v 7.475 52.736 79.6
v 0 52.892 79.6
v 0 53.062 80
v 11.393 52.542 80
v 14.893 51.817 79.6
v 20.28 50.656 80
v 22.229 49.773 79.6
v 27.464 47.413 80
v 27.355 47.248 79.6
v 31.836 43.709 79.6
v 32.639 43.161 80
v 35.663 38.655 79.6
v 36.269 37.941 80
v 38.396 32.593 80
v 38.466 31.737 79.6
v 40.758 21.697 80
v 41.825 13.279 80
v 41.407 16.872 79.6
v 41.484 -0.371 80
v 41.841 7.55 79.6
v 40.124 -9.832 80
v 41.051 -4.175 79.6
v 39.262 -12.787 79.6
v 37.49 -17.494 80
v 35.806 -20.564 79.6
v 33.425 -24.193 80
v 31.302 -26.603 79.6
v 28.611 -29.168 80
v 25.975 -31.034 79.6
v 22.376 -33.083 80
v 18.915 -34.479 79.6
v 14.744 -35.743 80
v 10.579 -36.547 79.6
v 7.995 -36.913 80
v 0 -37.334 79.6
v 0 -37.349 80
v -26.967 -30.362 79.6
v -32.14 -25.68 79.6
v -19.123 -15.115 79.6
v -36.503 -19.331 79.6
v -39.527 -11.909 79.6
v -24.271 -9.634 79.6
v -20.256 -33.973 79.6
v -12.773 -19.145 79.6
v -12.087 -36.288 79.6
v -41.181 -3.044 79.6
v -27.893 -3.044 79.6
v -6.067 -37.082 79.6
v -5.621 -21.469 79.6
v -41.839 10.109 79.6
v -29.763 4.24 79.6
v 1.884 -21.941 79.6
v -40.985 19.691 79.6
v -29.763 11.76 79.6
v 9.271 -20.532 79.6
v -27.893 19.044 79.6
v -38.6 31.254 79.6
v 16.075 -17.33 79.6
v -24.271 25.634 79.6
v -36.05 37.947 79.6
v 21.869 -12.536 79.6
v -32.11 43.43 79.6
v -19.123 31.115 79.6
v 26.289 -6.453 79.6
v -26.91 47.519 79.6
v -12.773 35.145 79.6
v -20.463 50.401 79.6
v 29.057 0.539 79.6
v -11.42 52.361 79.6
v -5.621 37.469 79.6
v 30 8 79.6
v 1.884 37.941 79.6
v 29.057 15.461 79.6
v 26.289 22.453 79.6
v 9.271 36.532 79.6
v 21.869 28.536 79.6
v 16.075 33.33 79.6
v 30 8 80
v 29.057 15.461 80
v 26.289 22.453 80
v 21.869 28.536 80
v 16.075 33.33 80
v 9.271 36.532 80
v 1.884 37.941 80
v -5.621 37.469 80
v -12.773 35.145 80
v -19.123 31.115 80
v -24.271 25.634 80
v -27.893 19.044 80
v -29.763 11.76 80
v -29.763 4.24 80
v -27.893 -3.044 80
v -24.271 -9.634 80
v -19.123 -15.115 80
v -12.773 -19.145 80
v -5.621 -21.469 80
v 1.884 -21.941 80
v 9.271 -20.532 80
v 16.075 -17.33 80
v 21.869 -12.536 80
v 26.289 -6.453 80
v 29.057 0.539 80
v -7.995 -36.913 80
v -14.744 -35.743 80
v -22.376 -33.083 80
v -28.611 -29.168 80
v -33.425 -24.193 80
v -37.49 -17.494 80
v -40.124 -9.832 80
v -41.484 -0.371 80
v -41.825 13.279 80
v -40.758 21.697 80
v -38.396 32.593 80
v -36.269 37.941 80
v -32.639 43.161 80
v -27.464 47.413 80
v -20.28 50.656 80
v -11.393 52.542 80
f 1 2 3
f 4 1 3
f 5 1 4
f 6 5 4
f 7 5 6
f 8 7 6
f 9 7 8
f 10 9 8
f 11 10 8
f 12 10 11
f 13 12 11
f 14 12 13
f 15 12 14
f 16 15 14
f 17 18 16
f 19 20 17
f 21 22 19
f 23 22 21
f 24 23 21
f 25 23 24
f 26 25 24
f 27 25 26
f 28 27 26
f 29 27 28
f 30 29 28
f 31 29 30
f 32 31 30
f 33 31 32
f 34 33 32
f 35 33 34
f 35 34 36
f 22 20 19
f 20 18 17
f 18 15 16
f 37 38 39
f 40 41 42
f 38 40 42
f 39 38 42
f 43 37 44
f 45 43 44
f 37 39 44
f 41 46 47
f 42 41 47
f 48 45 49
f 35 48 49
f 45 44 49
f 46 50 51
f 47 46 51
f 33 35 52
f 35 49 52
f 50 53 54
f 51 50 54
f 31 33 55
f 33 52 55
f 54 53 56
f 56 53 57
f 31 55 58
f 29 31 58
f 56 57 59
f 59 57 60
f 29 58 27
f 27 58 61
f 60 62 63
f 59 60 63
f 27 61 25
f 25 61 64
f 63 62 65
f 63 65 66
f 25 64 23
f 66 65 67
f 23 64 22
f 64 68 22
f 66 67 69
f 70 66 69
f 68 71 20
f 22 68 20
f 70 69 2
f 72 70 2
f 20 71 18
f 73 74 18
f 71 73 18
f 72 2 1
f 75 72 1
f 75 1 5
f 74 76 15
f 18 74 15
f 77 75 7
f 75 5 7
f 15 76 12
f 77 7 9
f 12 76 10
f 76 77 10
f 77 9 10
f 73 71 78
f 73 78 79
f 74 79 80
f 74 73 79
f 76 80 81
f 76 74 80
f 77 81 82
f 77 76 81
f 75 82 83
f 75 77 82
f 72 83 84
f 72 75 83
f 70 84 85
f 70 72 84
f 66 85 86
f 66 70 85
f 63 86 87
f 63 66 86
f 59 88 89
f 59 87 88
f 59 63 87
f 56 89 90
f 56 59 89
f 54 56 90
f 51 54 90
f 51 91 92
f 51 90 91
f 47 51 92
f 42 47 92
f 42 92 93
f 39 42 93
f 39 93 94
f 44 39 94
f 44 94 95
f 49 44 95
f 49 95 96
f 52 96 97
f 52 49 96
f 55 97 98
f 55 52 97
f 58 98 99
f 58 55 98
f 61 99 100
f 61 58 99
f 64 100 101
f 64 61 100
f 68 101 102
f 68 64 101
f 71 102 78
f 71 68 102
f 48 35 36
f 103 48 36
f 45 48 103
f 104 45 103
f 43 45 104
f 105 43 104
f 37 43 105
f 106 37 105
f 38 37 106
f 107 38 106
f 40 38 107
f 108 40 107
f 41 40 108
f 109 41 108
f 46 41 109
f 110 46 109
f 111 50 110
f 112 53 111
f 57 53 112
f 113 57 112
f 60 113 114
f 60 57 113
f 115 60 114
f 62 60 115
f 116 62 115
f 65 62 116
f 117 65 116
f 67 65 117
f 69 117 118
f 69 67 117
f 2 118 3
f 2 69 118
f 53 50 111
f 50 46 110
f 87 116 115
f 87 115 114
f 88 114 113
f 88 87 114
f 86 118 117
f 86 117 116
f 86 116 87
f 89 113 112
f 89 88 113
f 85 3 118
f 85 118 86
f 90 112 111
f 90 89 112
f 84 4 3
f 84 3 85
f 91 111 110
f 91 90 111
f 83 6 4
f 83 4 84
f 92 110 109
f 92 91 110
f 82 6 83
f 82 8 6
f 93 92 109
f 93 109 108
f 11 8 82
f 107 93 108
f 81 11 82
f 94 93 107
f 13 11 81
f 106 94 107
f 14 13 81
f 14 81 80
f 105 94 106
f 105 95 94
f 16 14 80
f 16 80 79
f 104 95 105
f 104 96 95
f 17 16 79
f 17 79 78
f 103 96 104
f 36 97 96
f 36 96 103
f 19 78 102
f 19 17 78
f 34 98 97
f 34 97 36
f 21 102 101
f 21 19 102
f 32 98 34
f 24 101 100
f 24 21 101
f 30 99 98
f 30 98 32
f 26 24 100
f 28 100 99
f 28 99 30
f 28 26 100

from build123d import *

# Parameters (mm, degrees)
CYLINDER_R     = 30
CYLINDER_DEPTH = 10
BOX001_W       = 100
BOX001_H       = 100
BOX001_DEPTH   = 0.4


with BuildPart() as cylinder:
    # Cylinder → Cylinder (new body)
    with BuildSketch(Plane(origin=(0, 8, 78.2), x_dir=(1, 0, 0), z_dir=(0, 0, 1))):
        Circle(CYLINDER_R)
    extrude(amount=CYLINDER_DEPTH)


with BuildPart() as cube001:
    # Box001 → Box001 (new body)
    with BuildSketch(Plane(origin=(-53, -45.8, 79.6), x_dir=(1, 0, 0), z_dir=(0, 0, 1))):
        with Locations((50, 50)):
            Rectangle(BOX001_W, BOX001_H)
    extrude(amount=BOX001_DEPTH)


with BuildPart() as body005:
    # Sketch013 → AdditiveLoft005 section 0
    with BuildSketch(Plane.XY.offset(41)):
        with BuildLine():
            add(Edge.make_bspline(
                [(0, 36.497025), (26.576986, 35.262943), (47.796365, 0), (27.047079, -34.785005), (0, -35.8137)],
                knots=[0, 0, 0, 0, 0.5, 1, 1, 1, 1], degree=3))
            add(Edge.make_bspline(
                [(0, 36.497025), (-26.576986, 35.262943), (-47.796365, 0), (-27.047079, -34.785005), (0, -35.8137)],
                knots=[0, 0, 0, 0, 0.5, 1, 1, 1, 1], degree=3))
        make_face()
    # Sketch012 → AdditiveLoft005 section 1
    with BuildSketch(Plane.XY):
        with BuildLine():
            add(Edge.make_bspline(
                [(0, 32.9051), (28.479158, 34.285235), (40.246082, 0), (29.153858, -32.29409), (0, -31.3846)],
                knots=[0, 0, 0, 0, 0.5, 1, 1, 1, 1], degree=3))
            add(Edge.make_bspline(
                [(0, 32.9051), (-28.479158, 34.285235), (-40.246082, 0), (-29.153858, -32.29409), (0, -31.3846)],
                knots=[0, 0, 0, 0, 0.5, 1, 1, 1, 1], degree=3))
        make_face()
    loft(ruled=True)


with BuildPart() as cut:
    # Sketch011 → AdditiveLoft004 section 0
    with BuildSketch(Plane.XY.offset(80)):
        with BuildLine():
            add(Edge.make_bspline(
                [(0, 53.061848), (33.768852, 53.748959), (41.60467, 20.311575), (41.974278, 11.194203), (41.83811, 0), (38.792742, -22.041952), (21.032879, -37.277655), (0, -37.349277)],
                knots=[0, 0, 0, 0, 0.2, 0.4, 0.6, 0.8, 1, 1, 1, 1], degree=3))
            add(Edge.make_bspline(
                [(0, 53.061848), (-33.768852, 53.748959), (-41.60467, 20.311575), (-41.974278, 11.194203), (-41.83811, 0), (-38.792742, -22.041952), (-21.032879, -37.277655), (0, -37.349277)],
                knots=[0, 0, 0, 0, 0.2, 0.4, 0.6, 0.8, 1, 1, 1, 1], degree=3))
        make_face()
    # Sketch010 → AdditiveLoft004 section 1
    with BuildSketch(Plane.XY.offset(41)):
        with BuildLine():
            add(Edge.make_bspline(
                [(0, 36.497025), (26.576986, 35.262943), (47.796365, 0), (27.047079, -34.785005), (0, -35.8137)],
                knots=[0, 0, 0, 0, 0.5, 1, 1, 1, 1], degree=3))
            add(Edge.make_bspline(
                [(0, 36.497025), (-26.576986, 35.262943), (-47.796365, 0), (-27.047079, -34.785005), (0, -35.8137)],
                knots=[0, 0, 0, 0, 0.5, 1, 1, 1, 1], degree=3))
        make_face()
    loft(ruled=True)

    # Fusion003: union Body005
    add(body005.part)

    # Common001: intersect Cube001
    add(cube001.part, mode=Mode.INTERSECT)

    # Cut: cut Cylinder
    add(cylinder.part, mode=Mode.SUBTRACT)


solid = cut.part
